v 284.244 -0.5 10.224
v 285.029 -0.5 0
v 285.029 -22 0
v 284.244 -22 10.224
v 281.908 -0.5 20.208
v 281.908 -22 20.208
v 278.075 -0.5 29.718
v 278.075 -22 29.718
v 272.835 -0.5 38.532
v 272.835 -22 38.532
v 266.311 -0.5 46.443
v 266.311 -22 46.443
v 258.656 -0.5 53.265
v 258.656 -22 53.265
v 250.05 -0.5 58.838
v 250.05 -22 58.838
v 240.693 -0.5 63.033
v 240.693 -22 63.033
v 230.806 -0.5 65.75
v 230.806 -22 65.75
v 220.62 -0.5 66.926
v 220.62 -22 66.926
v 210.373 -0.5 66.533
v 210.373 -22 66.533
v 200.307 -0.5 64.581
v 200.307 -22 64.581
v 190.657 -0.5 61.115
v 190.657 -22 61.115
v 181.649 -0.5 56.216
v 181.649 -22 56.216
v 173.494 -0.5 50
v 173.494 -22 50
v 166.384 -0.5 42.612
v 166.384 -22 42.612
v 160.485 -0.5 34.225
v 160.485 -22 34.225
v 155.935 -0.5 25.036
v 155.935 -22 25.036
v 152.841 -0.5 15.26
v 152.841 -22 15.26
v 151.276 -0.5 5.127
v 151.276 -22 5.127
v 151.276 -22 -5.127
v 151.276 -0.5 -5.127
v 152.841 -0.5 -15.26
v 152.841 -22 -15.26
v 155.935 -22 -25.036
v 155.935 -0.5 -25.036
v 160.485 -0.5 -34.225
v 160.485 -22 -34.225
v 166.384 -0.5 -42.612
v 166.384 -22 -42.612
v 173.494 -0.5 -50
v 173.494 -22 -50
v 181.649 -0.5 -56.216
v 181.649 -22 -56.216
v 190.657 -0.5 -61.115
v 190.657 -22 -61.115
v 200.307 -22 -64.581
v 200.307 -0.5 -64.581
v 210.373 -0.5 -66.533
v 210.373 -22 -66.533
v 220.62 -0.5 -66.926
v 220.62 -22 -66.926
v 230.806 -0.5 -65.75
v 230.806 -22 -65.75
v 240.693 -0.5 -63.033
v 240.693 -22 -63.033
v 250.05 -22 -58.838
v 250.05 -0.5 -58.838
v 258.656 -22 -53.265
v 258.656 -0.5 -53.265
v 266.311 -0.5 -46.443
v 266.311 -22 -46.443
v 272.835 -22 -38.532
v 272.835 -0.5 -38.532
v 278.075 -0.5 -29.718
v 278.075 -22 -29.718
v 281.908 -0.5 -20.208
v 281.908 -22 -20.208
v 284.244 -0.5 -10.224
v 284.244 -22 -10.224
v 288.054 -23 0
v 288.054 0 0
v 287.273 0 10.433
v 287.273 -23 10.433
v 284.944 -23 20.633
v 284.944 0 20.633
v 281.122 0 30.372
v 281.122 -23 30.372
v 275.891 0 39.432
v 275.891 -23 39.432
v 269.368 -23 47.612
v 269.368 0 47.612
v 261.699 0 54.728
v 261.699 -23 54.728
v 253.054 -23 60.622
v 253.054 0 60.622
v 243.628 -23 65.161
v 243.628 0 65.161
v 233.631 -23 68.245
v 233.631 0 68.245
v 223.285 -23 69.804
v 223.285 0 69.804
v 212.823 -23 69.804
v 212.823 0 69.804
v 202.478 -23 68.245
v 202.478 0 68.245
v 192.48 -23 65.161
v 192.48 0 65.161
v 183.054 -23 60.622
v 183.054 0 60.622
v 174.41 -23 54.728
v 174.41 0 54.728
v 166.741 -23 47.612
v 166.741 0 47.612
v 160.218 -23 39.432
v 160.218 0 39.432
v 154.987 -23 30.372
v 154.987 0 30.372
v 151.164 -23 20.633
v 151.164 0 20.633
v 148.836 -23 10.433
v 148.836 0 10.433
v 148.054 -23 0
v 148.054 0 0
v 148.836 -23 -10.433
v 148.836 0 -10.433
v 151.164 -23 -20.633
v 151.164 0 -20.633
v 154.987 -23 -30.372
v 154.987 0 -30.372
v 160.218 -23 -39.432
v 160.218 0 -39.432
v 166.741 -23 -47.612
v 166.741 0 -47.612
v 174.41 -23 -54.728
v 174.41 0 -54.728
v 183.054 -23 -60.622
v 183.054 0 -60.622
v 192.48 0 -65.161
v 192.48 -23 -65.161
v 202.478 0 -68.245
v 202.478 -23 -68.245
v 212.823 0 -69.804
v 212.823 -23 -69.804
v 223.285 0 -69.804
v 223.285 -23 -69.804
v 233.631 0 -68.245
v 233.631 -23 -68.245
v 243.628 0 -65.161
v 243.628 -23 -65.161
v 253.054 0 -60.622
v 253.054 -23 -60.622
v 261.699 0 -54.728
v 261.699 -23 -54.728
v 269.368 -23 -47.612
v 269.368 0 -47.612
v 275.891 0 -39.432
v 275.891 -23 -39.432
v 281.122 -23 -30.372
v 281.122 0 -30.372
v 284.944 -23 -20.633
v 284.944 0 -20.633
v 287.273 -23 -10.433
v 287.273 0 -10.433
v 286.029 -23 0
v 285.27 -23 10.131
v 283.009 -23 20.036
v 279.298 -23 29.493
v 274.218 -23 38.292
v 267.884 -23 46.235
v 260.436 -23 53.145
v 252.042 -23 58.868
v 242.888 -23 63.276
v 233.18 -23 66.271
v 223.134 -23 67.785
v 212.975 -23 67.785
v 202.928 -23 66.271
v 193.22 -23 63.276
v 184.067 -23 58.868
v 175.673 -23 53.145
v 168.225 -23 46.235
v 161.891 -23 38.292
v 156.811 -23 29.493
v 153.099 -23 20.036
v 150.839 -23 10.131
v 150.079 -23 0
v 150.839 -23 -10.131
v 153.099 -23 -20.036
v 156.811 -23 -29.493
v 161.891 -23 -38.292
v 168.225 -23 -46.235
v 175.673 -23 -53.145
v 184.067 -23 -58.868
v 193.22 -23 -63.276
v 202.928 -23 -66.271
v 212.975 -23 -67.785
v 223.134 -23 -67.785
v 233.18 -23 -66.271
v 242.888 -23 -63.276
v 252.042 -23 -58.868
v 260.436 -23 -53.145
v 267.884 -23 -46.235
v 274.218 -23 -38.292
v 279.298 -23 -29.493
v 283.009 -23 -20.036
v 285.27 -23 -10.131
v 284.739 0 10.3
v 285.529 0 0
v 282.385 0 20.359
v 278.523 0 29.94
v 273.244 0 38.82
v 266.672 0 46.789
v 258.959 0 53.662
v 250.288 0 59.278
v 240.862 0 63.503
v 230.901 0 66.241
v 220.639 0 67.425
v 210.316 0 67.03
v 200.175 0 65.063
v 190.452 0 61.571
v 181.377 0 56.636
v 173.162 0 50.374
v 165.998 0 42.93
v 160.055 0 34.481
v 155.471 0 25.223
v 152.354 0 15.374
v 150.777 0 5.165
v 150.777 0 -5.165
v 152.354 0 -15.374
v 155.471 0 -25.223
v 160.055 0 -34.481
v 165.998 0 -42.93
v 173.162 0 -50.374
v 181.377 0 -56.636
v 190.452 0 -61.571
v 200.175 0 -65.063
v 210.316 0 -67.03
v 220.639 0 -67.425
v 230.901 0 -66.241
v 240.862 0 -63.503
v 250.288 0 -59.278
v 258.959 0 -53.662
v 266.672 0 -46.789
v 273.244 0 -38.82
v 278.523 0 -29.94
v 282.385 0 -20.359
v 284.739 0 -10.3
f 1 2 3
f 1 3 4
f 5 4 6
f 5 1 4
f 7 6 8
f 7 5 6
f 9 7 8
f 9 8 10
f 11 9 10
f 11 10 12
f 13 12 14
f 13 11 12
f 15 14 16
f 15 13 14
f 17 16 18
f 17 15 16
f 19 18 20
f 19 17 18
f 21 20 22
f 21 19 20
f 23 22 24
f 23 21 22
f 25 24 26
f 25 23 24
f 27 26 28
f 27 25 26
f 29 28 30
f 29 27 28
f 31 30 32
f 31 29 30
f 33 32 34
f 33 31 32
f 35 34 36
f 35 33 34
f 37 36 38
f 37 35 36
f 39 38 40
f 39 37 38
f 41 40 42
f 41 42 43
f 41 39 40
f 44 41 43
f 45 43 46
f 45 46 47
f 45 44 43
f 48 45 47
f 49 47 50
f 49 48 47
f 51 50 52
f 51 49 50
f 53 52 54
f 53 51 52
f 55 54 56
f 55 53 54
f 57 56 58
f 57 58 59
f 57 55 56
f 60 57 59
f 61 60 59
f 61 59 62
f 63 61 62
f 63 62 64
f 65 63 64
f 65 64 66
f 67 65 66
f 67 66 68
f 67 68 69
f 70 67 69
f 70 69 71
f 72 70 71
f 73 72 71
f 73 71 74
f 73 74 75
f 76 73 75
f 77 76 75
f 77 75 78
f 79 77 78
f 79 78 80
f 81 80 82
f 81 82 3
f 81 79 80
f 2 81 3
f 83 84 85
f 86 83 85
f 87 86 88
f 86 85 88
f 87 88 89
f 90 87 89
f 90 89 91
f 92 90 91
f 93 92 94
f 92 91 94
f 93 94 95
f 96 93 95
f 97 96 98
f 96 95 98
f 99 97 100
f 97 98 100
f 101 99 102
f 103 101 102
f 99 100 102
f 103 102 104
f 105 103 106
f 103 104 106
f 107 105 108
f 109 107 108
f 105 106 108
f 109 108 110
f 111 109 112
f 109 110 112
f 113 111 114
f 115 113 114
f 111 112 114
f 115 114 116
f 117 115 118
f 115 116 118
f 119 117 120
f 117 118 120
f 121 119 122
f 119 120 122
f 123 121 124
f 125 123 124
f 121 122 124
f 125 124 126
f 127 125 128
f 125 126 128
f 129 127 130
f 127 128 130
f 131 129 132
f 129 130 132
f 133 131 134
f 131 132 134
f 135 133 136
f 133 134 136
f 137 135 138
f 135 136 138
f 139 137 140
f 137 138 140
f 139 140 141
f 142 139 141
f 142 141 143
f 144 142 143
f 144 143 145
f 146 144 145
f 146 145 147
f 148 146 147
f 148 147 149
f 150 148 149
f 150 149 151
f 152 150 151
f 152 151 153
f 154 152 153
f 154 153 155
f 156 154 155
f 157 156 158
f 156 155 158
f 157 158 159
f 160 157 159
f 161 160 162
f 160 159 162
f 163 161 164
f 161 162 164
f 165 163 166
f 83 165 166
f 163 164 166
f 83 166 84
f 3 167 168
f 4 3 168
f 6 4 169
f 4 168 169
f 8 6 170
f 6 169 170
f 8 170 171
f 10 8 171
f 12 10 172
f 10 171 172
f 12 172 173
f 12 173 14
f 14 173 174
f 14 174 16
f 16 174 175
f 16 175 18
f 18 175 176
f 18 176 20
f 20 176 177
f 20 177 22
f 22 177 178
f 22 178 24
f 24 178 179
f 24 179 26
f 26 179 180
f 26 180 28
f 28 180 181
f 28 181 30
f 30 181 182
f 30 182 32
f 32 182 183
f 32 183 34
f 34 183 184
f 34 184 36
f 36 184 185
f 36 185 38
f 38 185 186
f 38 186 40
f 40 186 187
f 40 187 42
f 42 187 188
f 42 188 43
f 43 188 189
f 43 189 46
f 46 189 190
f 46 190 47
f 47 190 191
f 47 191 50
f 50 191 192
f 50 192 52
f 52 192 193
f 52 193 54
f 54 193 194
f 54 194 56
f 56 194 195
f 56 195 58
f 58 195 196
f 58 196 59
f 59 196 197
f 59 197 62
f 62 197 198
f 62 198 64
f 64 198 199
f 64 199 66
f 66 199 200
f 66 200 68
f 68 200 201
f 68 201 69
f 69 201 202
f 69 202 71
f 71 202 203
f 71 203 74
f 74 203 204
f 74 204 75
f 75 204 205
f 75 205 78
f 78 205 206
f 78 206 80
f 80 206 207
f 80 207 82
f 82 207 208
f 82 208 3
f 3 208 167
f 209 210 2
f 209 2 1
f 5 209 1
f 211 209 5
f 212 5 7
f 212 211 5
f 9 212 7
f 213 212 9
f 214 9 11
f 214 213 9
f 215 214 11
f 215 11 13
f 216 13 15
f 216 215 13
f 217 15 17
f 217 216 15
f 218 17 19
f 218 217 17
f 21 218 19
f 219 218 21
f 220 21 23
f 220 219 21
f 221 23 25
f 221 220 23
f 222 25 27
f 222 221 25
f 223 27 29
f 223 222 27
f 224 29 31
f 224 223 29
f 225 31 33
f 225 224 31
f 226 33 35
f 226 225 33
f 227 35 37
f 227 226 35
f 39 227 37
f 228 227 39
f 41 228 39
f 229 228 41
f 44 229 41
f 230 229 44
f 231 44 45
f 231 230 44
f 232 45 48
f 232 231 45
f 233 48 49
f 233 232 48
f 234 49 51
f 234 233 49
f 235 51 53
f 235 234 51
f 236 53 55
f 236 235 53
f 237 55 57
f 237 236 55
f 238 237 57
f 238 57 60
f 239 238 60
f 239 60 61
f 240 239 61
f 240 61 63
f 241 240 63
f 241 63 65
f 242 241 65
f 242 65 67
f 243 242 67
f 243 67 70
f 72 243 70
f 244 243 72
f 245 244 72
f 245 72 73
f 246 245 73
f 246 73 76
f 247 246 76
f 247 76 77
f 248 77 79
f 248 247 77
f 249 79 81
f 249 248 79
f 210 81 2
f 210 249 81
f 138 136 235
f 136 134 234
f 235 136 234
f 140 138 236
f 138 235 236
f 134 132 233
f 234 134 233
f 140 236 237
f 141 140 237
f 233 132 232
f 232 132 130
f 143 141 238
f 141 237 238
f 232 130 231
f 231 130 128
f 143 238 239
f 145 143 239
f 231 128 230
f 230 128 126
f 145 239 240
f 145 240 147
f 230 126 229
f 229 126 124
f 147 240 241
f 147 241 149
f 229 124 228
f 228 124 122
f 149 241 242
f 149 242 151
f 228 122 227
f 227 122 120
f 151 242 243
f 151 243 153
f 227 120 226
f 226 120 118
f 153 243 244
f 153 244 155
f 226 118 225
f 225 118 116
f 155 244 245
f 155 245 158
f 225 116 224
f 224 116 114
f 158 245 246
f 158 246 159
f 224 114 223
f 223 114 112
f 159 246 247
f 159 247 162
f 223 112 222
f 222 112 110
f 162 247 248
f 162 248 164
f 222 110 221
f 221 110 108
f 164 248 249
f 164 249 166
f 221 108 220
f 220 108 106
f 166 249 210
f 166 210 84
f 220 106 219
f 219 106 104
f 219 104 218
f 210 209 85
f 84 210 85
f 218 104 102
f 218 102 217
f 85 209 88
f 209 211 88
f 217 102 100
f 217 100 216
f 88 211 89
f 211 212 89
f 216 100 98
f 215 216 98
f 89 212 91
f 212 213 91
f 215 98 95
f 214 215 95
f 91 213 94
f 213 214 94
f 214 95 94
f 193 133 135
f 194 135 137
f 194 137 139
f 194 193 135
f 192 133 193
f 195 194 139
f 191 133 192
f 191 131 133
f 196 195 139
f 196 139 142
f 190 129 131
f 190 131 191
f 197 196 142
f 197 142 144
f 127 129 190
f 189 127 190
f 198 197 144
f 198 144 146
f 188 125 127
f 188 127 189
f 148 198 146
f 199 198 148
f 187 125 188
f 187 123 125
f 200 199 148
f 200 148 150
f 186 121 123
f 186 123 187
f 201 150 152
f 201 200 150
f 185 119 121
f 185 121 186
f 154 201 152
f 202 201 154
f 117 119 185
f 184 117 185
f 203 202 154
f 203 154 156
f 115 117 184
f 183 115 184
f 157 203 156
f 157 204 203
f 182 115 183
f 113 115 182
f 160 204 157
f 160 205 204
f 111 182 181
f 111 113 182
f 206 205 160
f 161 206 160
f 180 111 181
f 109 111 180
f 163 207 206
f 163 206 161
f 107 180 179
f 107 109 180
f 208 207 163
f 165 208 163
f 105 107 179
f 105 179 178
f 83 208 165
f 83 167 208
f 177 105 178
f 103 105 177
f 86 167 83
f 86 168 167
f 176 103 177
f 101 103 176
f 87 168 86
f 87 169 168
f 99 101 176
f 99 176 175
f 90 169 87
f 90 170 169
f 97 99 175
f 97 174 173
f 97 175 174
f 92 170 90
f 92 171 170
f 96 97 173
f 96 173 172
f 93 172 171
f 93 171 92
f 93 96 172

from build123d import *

# Parameters (mm, degrees)
F0_R     = 70
F0_R_2   = 66.975
F1_DEPTH = 23
F2_SIZE  = 1
F3_SIZE  = 0.5


with BuildPart() as f1:
    # F0 (on Front) → F1 (new body)
    with BuildSketch(Plane.XZ):
        with Locations((218.054354, 0)):
            Circle(F0_R)
        with Locations((218.054354, 0)):
            Circle(F0_R_2, mode=Mode.SUBTRACT)
    extrude(amount=F1_DEPTH)

    # F2
    f2_edges = [f1.edges().sort_by_distance(p)[0] for p in [
        (151.079354, -23, 0),
    ]]
    chamfer(f2_edges, length=F2_SIZE)

    # F3
    f3_edges = [f1.edges().sort_by_distance(p)[0] for p in [
        (151.079354, 0, 0),
    ]]
    chamfer(f3_edges, length=F3_SIZE)


solid = f1.part
